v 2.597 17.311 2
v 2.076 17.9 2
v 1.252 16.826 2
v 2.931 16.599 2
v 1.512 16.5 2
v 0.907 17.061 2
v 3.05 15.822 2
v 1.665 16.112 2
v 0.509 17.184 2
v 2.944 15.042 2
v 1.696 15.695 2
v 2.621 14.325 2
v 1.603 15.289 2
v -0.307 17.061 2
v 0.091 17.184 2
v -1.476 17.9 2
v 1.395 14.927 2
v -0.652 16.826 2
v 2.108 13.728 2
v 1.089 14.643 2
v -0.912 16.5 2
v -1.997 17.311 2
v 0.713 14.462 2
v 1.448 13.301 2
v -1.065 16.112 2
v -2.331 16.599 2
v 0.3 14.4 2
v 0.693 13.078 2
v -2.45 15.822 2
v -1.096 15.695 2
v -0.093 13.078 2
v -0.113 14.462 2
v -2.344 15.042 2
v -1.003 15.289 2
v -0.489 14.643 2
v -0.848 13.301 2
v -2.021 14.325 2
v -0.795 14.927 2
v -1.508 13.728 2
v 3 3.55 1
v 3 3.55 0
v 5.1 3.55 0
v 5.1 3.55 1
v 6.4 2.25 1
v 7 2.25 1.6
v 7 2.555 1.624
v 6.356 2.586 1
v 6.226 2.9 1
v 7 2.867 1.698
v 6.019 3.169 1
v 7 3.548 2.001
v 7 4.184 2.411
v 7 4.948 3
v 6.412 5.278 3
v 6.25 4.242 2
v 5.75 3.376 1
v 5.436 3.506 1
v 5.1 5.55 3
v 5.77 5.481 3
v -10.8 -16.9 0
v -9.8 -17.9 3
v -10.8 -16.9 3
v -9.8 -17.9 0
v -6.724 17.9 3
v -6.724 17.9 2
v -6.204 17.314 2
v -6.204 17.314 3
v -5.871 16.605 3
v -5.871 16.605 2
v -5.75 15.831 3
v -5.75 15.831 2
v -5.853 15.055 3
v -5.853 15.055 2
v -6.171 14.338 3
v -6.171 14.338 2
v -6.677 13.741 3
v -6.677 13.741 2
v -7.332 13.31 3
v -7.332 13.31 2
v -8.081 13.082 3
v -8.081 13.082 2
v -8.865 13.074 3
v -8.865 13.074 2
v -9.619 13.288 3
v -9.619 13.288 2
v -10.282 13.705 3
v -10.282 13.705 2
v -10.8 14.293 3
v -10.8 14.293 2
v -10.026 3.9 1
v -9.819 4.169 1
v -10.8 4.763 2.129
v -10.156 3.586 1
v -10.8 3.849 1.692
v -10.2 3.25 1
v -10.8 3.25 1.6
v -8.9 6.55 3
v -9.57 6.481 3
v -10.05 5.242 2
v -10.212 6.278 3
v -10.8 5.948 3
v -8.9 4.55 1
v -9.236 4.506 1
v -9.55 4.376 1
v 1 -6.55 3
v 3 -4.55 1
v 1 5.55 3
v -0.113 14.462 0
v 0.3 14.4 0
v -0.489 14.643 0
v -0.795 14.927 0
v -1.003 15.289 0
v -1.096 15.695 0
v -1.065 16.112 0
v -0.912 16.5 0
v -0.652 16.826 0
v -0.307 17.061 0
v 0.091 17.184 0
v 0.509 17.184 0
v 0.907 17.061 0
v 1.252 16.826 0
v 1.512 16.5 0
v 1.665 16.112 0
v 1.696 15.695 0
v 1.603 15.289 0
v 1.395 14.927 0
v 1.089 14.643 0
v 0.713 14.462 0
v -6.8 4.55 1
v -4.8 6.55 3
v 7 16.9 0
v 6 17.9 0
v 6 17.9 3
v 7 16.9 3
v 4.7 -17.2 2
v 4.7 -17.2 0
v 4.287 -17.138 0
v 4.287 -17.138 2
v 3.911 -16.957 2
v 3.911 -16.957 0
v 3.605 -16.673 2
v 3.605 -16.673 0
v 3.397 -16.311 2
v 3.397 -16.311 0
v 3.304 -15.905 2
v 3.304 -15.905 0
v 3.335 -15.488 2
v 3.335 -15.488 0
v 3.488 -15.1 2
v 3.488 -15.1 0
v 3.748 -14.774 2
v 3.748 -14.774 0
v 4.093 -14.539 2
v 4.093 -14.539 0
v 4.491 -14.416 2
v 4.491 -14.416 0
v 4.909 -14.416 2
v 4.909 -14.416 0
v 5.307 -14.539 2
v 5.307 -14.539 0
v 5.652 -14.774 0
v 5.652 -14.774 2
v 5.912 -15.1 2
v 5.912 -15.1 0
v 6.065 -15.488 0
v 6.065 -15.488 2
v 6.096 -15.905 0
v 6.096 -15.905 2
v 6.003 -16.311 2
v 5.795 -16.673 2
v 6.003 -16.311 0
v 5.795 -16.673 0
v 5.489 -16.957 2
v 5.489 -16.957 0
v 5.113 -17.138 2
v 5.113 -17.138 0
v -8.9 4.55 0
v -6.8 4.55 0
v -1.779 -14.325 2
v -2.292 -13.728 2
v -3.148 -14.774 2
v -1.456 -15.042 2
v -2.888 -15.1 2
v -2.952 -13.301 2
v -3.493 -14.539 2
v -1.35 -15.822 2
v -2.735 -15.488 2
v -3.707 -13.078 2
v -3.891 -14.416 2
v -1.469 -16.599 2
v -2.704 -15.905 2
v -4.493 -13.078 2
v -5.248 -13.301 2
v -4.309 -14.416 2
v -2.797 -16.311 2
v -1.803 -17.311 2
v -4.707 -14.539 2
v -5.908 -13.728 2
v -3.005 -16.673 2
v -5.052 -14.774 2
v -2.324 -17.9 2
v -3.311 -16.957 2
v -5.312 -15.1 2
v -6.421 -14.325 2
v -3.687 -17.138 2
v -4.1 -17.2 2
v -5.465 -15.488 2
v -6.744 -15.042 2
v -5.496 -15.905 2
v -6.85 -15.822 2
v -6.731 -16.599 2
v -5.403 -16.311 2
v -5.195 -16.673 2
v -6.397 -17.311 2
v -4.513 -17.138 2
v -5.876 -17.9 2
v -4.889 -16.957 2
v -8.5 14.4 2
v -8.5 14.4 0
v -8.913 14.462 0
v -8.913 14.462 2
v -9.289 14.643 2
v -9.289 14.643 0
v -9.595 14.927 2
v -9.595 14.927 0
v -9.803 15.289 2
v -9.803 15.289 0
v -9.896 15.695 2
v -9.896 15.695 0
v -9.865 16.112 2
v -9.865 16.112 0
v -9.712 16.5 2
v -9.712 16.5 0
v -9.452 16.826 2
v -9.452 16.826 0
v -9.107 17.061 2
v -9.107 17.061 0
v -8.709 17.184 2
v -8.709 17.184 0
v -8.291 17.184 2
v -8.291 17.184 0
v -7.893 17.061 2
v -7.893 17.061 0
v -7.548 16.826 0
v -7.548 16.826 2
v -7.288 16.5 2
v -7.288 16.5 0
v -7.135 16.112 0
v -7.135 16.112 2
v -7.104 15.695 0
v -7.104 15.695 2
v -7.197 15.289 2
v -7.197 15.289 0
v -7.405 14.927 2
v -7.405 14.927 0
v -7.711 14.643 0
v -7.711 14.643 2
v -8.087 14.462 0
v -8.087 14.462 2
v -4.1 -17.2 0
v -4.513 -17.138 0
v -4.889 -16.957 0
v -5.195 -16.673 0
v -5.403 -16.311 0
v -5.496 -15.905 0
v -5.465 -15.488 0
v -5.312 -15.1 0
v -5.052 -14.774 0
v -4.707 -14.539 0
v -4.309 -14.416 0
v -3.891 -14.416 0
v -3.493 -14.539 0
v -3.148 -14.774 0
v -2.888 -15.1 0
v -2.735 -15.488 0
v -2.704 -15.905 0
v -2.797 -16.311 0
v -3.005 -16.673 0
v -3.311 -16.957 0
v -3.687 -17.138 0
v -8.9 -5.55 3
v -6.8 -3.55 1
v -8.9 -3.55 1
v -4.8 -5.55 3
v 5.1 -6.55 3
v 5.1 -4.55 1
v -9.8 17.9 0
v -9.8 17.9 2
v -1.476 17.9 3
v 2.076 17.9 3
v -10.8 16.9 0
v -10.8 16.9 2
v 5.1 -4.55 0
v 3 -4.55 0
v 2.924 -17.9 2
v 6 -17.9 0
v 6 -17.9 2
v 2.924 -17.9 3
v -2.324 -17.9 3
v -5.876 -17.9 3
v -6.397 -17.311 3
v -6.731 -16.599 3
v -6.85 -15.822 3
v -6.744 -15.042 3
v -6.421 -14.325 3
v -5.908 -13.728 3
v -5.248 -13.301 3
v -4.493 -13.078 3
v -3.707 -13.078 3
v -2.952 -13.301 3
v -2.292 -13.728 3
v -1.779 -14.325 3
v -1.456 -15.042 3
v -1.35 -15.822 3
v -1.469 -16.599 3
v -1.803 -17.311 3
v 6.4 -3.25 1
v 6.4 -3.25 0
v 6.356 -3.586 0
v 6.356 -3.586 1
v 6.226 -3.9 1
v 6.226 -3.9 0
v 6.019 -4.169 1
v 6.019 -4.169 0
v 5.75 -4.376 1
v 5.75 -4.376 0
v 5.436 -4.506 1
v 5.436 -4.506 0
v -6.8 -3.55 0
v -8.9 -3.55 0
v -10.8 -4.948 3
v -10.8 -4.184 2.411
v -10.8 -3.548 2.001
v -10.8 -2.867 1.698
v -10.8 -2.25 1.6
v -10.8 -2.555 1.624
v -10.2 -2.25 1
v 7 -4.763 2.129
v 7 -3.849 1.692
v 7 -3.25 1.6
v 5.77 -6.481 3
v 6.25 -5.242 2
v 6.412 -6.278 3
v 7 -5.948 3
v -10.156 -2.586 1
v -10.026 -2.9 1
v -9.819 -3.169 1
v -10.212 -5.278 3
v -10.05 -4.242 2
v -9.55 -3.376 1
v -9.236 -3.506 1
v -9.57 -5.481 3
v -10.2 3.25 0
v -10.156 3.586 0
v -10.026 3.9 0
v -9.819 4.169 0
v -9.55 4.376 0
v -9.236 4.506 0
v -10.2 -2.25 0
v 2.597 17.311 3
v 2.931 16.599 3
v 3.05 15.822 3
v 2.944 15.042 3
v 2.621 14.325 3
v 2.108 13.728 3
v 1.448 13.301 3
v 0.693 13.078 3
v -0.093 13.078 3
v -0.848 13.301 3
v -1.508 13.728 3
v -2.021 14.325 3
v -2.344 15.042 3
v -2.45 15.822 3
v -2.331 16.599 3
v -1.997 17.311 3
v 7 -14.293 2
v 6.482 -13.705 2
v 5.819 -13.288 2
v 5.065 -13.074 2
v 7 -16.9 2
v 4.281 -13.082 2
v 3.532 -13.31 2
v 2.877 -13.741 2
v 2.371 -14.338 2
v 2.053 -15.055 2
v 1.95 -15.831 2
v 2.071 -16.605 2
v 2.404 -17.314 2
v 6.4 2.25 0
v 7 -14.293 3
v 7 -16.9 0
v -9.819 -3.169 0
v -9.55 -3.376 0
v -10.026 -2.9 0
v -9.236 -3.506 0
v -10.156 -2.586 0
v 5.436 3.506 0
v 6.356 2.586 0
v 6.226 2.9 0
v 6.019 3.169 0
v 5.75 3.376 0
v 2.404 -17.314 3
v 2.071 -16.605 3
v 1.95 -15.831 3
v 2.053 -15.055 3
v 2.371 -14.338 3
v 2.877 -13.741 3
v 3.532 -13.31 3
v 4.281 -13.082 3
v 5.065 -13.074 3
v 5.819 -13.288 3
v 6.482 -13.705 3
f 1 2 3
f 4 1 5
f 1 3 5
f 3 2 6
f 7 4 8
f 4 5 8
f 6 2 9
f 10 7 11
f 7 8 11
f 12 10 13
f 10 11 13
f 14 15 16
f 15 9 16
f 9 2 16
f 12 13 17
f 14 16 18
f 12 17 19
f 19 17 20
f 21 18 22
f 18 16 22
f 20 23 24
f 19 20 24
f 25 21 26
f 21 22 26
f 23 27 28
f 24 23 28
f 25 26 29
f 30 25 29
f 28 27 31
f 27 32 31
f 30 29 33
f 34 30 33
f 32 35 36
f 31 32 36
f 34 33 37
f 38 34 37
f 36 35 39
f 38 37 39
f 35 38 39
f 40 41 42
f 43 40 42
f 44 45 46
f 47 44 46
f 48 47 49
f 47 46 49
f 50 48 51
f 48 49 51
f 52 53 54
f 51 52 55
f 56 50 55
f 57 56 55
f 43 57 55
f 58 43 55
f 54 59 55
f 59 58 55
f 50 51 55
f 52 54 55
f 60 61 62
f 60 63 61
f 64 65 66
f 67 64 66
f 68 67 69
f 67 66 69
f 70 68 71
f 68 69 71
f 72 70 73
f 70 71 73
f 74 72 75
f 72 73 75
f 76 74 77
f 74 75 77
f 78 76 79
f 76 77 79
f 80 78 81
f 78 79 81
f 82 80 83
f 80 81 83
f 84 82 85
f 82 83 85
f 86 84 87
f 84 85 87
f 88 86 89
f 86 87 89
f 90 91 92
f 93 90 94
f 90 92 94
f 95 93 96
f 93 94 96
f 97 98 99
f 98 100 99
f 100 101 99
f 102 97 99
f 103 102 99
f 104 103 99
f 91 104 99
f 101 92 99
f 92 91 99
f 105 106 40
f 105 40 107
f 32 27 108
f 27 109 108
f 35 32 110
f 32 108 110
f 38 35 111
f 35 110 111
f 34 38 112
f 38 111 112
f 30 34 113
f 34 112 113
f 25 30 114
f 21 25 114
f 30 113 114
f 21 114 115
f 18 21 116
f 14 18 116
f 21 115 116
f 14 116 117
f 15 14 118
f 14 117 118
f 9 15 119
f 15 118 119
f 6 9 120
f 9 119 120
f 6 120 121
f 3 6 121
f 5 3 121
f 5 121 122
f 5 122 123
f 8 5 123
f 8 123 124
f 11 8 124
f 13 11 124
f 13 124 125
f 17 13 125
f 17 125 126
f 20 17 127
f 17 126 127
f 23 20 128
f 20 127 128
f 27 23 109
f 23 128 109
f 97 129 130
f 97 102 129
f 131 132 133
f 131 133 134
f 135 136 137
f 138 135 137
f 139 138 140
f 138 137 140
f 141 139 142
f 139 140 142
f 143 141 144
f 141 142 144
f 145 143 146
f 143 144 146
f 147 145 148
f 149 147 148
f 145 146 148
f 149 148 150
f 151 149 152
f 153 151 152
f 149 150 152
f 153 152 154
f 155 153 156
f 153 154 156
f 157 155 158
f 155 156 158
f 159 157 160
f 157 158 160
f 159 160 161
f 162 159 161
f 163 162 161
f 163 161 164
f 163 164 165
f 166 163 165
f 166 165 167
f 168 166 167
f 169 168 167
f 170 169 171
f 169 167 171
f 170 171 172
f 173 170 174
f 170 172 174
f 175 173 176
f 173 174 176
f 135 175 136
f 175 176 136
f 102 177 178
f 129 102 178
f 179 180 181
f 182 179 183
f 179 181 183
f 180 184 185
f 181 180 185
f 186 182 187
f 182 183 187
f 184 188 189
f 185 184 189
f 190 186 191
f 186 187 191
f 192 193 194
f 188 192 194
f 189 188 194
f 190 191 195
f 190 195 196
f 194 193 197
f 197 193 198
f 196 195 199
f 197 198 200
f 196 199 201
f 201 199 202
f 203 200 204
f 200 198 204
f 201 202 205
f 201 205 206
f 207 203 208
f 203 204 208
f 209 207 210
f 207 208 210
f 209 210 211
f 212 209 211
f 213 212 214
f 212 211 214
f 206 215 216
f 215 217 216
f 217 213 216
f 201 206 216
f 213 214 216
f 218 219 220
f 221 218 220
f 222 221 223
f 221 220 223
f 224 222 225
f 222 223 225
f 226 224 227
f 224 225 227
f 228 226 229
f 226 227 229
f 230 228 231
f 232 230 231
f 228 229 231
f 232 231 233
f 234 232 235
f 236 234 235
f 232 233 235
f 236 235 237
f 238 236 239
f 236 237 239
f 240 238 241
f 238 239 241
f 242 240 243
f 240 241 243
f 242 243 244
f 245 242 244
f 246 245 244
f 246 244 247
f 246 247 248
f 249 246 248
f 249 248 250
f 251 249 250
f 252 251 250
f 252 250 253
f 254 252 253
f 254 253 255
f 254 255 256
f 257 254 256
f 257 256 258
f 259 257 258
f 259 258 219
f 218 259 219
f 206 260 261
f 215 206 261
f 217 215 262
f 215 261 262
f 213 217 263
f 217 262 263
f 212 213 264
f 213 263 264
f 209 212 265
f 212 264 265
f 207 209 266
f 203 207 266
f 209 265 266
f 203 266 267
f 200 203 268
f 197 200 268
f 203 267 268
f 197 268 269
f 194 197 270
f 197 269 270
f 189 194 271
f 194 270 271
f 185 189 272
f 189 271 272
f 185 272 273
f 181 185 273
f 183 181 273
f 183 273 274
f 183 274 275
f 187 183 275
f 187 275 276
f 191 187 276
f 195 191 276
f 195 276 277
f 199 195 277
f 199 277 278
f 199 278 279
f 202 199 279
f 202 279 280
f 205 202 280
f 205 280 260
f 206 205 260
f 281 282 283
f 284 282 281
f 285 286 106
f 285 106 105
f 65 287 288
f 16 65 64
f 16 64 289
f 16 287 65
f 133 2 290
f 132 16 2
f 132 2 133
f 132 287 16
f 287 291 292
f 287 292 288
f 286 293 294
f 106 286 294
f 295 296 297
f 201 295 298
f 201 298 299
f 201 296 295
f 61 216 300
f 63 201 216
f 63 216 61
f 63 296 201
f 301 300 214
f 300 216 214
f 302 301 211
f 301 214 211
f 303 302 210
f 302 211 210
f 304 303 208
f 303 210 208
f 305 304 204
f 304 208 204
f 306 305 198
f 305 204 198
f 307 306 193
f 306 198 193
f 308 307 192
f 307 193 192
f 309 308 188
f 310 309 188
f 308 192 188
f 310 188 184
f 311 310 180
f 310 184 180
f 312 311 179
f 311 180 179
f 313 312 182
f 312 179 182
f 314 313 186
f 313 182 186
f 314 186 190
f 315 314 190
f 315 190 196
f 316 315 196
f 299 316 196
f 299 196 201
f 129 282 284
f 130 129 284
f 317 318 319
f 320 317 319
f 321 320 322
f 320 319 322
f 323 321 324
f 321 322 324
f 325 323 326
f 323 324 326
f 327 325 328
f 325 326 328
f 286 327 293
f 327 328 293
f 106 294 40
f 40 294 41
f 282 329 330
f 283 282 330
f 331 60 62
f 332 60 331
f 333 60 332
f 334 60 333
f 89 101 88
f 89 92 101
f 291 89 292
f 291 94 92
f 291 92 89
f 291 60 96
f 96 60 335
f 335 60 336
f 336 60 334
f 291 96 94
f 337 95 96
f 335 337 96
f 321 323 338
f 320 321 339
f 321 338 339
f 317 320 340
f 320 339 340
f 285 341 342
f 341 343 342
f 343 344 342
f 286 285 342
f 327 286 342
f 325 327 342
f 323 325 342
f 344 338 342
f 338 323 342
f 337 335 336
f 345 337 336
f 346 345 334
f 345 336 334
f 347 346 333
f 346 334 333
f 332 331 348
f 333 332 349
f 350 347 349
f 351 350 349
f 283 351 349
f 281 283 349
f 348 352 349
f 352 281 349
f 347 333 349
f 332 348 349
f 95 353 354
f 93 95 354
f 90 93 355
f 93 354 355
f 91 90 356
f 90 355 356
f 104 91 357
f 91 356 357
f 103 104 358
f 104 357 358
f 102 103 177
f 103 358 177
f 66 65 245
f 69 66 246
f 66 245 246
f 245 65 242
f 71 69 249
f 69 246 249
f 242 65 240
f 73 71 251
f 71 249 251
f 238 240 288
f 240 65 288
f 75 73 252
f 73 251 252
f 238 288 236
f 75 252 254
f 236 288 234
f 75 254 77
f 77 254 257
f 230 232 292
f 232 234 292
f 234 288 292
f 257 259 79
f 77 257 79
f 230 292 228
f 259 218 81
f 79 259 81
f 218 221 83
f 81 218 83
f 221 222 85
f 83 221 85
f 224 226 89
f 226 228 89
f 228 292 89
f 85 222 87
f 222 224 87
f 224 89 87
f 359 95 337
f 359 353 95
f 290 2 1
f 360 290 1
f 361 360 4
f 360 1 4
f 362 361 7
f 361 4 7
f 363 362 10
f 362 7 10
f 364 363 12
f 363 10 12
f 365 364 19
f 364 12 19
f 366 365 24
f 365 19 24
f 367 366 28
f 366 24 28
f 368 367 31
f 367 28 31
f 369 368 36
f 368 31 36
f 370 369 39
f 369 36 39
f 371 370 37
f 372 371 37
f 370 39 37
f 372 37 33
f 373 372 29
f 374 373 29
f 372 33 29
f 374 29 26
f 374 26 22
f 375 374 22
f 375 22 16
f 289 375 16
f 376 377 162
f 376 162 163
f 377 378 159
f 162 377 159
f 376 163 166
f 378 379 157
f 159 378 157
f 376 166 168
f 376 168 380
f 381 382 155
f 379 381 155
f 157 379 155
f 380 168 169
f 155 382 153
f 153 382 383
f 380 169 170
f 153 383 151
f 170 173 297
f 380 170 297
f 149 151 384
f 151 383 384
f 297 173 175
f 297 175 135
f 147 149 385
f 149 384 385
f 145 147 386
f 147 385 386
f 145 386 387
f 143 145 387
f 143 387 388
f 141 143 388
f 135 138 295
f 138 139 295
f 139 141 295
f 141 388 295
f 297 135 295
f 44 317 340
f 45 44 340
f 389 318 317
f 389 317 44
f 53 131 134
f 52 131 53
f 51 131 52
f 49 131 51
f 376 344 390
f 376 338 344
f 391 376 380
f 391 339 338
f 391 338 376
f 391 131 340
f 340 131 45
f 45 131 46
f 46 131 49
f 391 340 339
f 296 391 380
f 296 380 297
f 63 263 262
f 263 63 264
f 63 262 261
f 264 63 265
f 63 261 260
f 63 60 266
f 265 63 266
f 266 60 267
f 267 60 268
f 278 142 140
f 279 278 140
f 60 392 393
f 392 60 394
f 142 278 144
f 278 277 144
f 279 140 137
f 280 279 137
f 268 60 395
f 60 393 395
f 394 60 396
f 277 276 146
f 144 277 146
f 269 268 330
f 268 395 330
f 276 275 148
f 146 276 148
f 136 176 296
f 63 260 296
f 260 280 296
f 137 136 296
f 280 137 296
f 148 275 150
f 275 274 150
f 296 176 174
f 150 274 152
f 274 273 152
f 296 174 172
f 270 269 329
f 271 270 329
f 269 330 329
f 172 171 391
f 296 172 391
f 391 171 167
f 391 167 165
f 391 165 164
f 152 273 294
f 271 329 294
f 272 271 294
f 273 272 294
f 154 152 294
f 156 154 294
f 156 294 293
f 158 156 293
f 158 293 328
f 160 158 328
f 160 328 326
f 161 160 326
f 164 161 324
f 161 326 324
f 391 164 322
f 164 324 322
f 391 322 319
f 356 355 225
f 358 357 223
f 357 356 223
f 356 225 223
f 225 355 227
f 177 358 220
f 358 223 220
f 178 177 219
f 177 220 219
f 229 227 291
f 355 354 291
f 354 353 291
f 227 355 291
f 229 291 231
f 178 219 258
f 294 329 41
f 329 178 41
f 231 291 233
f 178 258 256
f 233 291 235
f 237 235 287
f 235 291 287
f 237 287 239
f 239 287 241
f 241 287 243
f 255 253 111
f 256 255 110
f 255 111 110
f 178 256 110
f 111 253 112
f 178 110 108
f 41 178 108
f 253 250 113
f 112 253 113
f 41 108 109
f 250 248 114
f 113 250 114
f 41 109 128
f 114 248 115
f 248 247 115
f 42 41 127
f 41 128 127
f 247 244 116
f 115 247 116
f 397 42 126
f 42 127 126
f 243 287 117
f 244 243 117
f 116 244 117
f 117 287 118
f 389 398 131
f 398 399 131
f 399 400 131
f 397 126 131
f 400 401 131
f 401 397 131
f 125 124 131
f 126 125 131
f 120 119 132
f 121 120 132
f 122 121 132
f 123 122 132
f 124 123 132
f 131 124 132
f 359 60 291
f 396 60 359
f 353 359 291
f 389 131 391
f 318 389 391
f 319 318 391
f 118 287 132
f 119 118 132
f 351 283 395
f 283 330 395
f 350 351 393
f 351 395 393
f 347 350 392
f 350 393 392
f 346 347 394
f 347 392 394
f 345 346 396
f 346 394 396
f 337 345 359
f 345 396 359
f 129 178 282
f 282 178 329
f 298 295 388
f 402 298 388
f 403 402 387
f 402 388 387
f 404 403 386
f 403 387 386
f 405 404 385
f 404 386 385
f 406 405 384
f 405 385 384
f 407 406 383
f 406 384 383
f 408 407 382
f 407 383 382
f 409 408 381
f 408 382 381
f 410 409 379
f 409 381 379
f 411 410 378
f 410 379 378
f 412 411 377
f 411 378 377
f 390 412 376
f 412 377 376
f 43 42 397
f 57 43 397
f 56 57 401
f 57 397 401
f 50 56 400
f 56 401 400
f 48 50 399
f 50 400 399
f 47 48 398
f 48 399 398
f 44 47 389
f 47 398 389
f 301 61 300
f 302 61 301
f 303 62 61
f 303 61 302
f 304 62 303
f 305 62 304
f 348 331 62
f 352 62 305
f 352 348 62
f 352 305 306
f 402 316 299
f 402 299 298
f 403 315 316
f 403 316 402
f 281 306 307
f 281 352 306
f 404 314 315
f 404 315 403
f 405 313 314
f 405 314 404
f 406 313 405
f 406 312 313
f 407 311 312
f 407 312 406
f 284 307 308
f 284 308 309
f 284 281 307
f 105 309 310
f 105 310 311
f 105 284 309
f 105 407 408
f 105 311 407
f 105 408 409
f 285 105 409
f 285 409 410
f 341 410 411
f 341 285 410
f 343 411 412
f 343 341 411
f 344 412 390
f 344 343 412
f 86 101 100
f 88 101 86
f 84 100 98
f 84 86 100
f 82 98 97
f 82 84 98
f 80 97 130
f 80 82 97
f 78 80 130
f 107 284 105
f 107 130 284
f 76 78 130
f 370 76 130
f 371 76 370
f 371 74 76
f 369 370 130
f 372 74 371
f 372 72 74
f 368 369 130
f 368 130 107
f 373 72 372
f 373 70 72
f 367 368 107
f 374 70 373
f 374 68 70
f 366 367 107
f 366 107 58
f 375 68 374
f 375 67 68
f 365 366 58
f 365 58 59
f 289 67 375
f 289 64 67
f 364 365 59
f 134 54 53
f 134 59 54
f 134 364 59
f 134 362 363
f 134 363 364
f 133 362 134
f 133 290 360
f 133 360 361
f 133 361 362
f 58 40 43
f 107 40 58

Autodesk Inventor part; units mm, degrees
ref_plane "YZ Plane" through (0, 0, 0) normal (1, 0, 0) x (0, 1, 0)
ref_plane "XZ Plane" through (0, 0, 0) normal (0, 1, 0) x (-1, 0, 0)
ref_plane "XY Plane" through (0, 0, 0) normal (0, 0, 1) x (1, 0, 0)
ref_plane "Arbeitsebene1" through (0, 0, 0) normal (0, 0, 1) x (1, 0, 0)
sketch "Skizze1" plane through (0, 0, 0) normal (0, 0, 1) x (1, 0, 0)
  line L0 (6, 17.9) -> (7, 16.9) projected
  line L1 (3.1, 17.9) -> (6, 17.9) projected
  line L2 (3.1, 14) -> (3.1, 17.9) projected
  line L3 (3.5, 14) -> (3.1, 14) projected
  line L4 (3.5, 10) -> (3.5, 14) projected
  line L5 (6.4, 10) -> (3.5, 10) projected
  line L6 (6.4, -11.4) -> (6.4, 10) projected
  line L7 (3.8, -11.4) -> (6.4, -11.4) projected
  line L8 (3.8, -14.4) -> (3.8, -11.4) projected
  line L9 (1.3, -14.4) -> (3.8, -14.4) projected
  line L10 (1.3, -13.4) -> (1.3, -14.4) projected
  line L11 (-0.7, -13.4) -> (1.3, -13.4) projected
  line L12 (-0.7, -14.4) -> (-0.7, -13.4) projected
  line L13 (-6.9, -14.4) -> (-5.1, -14.4) projected
  line L14 (-4.1, -13.4) -> (-4.1, -14.4) projected
  line L15 (-5.1, -13.4) -> (-4.1, -13.4) projected
  line L16 (-5.1, -14.4) -> (-5.1, -13.4) projected
  line L17 (-6.9, -17.9) -> (-6.9, -14.4) projected
  line L18 (6, -17.9) -> (-6.9, -17.9) projected
  line L19 (7, -16.9) -> (6, -17.9) projected
  line L20 (7, 16.9) -> (7, -16.9) projected
  line L21 (6, 17.9) -> (7, 16.9) projected
  line L22 (3.1, 17.9) -> (6, 17.9) projected
  line L23 (3.1, 14) -> (3.1, 17.9) projected
  line L24 (3.5, 14) -> (3.1, 14) projected
  line L25 (3.5, 10) -> (3.5, 14) projected
  line L26 (6.4, 10) -> (3.5, 10) projected
  line L27 (6.4, -11.4) -> (6.4, 10) projected
  line L28 (3.8, -11.4) -> (6.4, -11.4) projected
  line L29 (3.8, -14.4) -> (3.8, -11.4) projected
  line L30 (1.3, -14.4) -> (3.8, -14.4) projected
  line L31 (1.3, -13.4) -> (1.3, -14.4) projected
  line L32 (-0.7, -13.4) -> (1.3, -13.4) projected
  line L33 (-0.7, -14.4) -> (-0.7, -13.4) projected
  line L34 (-6.9, -14.4) -> (-5.1, -14.4) projected
  line L35 (-4.1, -13.4) -> (-4.1, -14.4) projected
  line L36 (-5.1, -13.4) -> (-4.1, -13.4) projected
  line L37 (-5.1, -14.4) -> (-5.1, -13.4) projected
  line L38 (-6.9, -17.9) -> (-6.9, -14.4) projected
  line L39 (6, -17.9) -> (-6.9, -17.9) projected
  line L40 (7, -16.9) -> (6, -17.9) projected
  line L41 (7, 16.9) -> (7, -16.9) projected
  line L42 (-9.8, -17.9) -> (-10.8, -16.9) projected
  line L43 (-6.9, -17.9) -> (-9.8, -17.9) projected
  line L44 (-6.9, -14) -> (-6.9, -17.9) projected
  line L45 (-7.3, -14) -> (-6.9, -14) projected
  line L46 (-7.3, -10) -> (-7.3, -14) projected
  line L47 (-10.2, -10) -> (-7.3, -10) projected
  line L48 (-10.2, 11.4) -> (-10.2, -10) projected
  line L49 (-7.6, 11.4) -> (-10.2, 11.4) projected
  line L50 (-7.6, 14.4) -> (-7.6, 11.4) projected
  line L51 (-5.1, 14.4) -> (-7.6, 14.4) projected
  line L52 (-5.1, 13.4) -> (-5.1, 14.4) projected
  line L53 (-3.1, 13.4) -> (-5.1, 13.4) projected
  line L54 (-3.1, 14.4) -> (-3.1, 13.4) projected
  line L55 (3.1, 14.4) -> (1.3, 14.4) projected
  line L56 (0.3, 13.4) -> (0.3, 14.4) projected
  line L57 (1.3, 13.4) -> (0.3, 13.4) projected
  line L58 (1.3, 14.4) -> (1.3, 13.4) projected
  line L59 (3.1, 17.9) -> (3.1, 14.4) projected
  line L60 (-9.8, 17.9) -> (3.1, 17.9) projected
  line L61 (-10.8, 16.9) -> (-9.8, 17.9) projected
  line L62 (-10.8, -16.9) -> (-10.8, 16.9) projected
  arc A0 (5.1, -4.25) -> (6.1, -3.25) centre (5.1, -3.25) ccw construction
  line L63 (6.1, 2.25) -> (6.1, -3.25) construction
  arc A1 (6.1, 2.25) -> (5.1, 3.25) centre (5.1, 2.25) ccw construction
  line L64 (3.3, 3.25) -> (5.1, 3.25) construction
  line L65 (3.3, 3.25) -> (3.3, -4.25) construction
  line L66 (3.3, -4.25) -> (5.1, -4.25) construction
  arc A2 (-8.9, 4.25) -> (-9.9, 3.25) centre (-8.9, 3.25) ccw construction
  line L67 (-9.9, -2.25) -> (-9.9, 3.25) construction
  arc A3 (-9.9, -2.25) -> (-8.9, -3.25) centre (-8.9, -2.25) ccw construction
  line L68 (-7.1, -3.25) -> (-8.9, -3.25) construction
  line L69 (-7.1, -3.25) -> (-7.1, 4.25) construction
  line L70 (-7.1, 4.25) -> (-8.9, 4.25) construction
  line L71 (3, -4.55) -> (3, 3.55)
  line L72 (3, 3.55) -> (5.1, 3.55)
  arc A4 (6.4, 2.25) -> (5.1, 3.55) centre (5.1, 2.25) ccw
  line L73 (6.4, 2.25) -> (6.4, -3.25)
  arc A5 (5.1, -4.55) -> (6.4, -3.25) centre (5.1, -3.25) ccw
  line L74 (5.1, -4.55) -> (3, -4.55)
  arc A6 (-10.2, -2.25) -> (-8.9, -3.55) centre (-8.9, -2.25) ccw
  line L75 (-10.2, -2.25) -> (-10.2, 3.25)
  arc A7 (-8.9, 4.55) -> (-10.2, 3.25) centre (-8.9, 3.25) ccw
  line L76 (-8.9, 4.55) -> (-6.8, 4.55)
  line L77 (-6.8, 4.55) -> (-6.8, -3.55)
  line L78 (-6.8, -3.55) -> (-8.9, -3.55)
  circle A8 centre (4.7, -15.8) radius 1.4 projected
  circle A9 centre (4.7, -15.8) radius 1.4 projected
  circle A10 centre (-8.5, 15.8) radius 1.4 projected
  circle A11 centre (-4.1, -15.8) radius 1.4 projected
  circle A12 centre (-4.1, -15.8) radius 1.4 projected
  line L79 (-4.1, -14.4) -> (-0.7, -14.4) projected
  circle A13 centre (-4.1, -15.8) radius 1.4 projected
  circle A14 centre (-4.1, -15.8) radius 1.4 projected
  line L80 (-4.1, -14.4) -> (-0.7, -14.4) projected
  circle A15 centre (0.3, 15.8) radius 1.4 projected
  circle A16 centre (0.3, 15.8) radius 1.4 projected
  line L81 (0.3, 14.4) -> (-3.1, 14.4) projected
  point P0 (0, 0)
  point P1 (-2.4, -14.4)
  point P2 (-2.5, -14.4)
  point P3 (-1.4, 14.4)
  point P4 (-1.3, 14.4)
  dimension "d0" = 0.3
  dimension "d1" = 0.3
extrude "Extrusion1" add sketch "Skizze1" along normal blind 3 contours A11 | L0 L20 L19 L18 L17 L13 L16 L15 L14 L79 L12 L11 L10 L9 L8 L7 L6 L5 L4 L3 L2 L1 | A15 | L2 L55 L58 L57 L56 L81 L54 L53 L52 L51 L50 L49 L48 L47 L46 L45 L44 L17 L43 L42 L62 L61 L60 | L2 L3 L4 L5 L6 A4 L72 L71 L74 A5 L7 L8 L9 L10 L11 L12 L79 L14 L15 L16 L13 L44 L45 L46 L47 L48 A6 L78 L77 L76 A7 L49 L50 L51 L52 L53 L54 L81 L56 L57 L58 L55 | A8 | A10
sketch "Skizze2" plane through (0, 0, 3) normal (0, 0, 1) x (1, 0, 0)
  point P0 (0, 0)
sketch "Skizze3" plane through (0, 0, 3) normal (0, 0, 1) x (1, 0, 0)
  circle A0 centre (-8.5, 15.8) radius 1.4 projected
  circle A1 centre (0.3, 15.8) radius 1.4 projected
  circle A2 centre (4.7, -15.8) radius 1.4 projected
  circle A3 centre (-4.1, -15.8) radius 1.4 projected
  point P0 (0, 0)
hole "Bohrung1" at (0.3, 15.8, 3) at (4.7, -15.8, 3) at (-4.1, -15.8, 3) at (-8.5, 15.8, 3) direction (0, 0, -1) diameter 2.8 depth 12 tip angle 118 counterbore diameter 5.5 counterbore depth 1
chamfer "Fase1" distance 2 angle 45 12 edges at (6.0192, 3.1692, 3) (6.4, -0.5, 3) (6.0192, -4.1692, 3) (4.05, -4.55, 3) (4.05, 3.55, 3) (3, -0.5, 3) (-6.8, 0.5, 3) (-9.8192, 4.1692, 3) (-7.85, 4.55, 3) (-10.2, 0.5, 3) (-9.8192, -3.1692, 3) (-7.85, -3.55, 3)
properties part number "02_Camera_Module_Lid_v0"
